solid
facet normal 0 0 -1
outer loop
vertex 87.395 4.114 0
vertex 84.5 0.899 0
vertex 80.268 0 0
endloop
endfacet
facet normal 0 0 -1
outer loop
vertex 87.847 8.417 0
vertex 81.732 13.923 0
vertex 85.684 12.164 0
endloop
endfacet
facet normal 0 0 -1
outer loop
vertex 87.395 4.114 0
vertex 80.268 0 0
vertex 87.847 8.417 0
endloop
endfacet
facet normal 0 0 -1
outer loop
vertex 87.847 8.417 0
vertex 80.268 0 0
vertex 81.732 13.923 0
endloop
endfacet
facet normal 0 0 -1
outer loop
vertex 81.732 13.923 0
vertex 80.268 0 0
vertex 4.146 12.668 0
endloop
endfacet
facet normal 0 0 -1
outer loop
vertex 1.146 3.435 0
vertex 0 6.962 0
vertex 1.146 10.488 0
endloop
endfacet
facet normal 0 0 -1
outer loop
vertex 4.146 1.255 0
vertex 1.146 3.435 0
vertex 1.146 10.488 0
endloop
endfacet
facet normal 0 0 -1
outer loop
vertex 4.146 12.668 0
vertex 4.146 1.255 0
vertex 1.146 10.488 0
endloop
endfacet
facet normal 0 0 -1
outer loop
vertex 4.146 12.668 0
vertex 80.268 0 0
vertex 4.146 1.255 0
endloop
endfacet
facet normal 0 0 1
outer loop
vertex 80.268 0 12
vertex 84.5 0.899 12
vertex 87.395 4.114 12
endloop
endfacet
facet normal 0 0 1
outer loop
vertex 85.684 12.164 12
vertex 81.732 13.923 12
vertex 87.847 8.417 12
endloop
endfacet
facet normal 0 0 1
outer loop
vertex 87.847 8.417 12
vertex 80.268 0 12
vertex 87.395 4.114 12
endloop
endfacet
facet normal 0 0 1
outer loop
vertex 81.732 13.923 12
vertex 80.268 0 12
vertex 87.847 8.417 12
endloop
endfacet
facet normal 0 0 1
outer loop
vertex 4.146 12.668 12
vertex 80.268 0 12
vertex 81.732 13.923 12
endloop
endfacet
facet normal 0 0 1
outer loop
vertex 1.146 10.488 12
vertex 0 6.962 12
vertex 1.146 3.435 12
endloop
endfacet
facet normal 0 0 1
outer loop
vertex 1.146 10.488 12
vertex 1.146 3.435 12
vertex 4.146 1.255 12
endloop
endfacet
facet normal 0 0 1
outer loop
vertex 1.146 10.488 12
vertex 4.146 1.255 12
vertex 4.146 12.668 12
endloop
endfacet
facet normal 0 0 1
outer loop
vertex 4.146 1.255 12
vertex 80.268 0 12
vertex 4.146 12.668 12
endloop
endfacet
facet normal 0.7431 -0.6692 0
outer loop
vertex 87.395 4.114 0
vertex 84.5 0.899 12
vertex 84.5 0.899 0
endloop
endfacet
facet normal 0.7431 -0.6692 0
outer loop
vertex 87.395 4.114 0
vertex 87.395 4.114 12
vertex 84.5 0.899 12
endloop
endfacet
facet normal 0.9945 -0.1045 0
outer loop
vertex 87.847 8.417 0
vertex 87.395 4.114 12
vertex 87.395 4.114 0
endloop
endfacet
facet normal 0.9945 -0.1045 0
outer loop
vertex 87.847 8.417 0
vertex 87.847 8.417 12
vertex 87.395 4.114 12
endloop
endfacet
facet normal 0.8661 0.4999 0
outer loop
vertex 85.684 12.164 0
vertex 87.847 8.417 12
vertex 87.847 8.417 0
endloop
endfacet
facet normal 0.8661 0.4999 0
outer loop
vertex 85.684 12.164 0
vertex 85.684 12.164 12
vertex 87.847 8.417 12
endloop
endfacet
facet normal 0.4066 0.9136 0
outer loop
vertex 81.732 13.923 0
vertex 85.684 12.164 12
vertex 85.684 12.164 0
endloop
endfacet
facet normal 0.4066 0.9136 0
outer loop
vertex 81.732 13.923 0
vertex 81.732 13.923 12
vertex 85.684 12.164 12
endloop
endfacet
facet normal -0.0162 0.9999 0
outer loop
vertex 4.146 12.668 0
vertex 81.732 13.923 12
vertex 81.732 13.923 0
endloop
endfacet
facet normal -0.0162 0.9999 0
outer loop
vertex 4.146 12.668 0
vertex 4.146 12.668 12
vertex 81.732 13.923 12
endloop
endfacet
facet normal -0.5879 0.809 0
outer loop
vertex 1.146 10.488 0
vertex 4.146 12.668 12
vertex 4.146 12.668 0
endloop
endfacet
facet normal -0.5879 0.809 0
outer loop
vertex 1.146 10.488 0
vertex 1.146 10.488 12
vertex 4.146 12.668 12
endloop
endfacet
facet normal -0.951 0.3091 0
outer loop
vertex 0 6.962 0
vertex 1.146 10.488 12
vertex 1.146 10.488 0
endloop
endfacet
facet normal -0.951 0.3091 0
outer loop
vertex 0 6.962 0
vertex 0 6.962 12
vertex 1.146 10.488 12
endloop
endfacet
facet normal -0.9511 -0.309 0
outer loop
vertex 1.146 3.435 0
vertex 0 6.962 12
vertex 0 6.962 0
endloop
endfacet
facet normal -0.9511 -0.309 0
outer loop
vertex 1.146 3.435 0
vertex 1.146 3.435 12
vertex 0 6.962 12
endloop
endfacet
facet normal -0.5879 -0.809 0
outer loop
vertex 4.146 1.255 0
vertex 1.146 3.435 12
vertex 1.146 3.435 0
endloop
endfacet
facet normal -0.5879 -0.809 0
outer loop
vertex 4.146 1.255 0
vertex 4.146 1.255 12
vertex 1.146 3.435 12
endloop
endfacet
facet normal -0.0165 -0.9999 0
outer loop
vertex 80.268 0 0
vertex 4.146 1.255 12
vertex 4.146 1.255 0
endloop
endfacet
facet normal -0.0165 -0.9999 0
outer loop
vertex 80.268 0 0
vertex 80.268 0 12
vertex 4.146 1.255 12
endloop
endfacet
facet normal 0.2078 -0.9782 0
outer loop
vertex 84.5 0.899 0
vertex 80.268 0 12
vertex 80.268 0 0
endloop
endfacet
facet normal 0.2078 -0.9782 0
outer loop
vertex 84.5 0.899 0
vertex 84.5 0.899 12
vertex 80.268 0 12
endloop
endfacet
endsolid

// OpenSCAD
$fn = 32;

// ----------------------------------------------------------------------
// Lever arm: two bosses 12 and 14 mm, 75 mm between centres
// ----------------------------------------------------------------------

// --- parameters (mm) ---
profile_height = 12;      // extrusion height
profile_points = 11;      // points of the closed outline

profile = [[0, 6.962], [1.146, 3.435], [4.146, 1.255], [80.268, 0], [84.5, 0.899], [87.395, 4.114], [87.847, 8.417], [85.684, 12.164], [81.732, 13.923], [4.146, 12.668], [1.146, 10.488]];  // single closed polygon, 11 points, counter clockwise

// --- the one profile operation ---
linear_extrude(height = profile_height) polygon(points = profile);
